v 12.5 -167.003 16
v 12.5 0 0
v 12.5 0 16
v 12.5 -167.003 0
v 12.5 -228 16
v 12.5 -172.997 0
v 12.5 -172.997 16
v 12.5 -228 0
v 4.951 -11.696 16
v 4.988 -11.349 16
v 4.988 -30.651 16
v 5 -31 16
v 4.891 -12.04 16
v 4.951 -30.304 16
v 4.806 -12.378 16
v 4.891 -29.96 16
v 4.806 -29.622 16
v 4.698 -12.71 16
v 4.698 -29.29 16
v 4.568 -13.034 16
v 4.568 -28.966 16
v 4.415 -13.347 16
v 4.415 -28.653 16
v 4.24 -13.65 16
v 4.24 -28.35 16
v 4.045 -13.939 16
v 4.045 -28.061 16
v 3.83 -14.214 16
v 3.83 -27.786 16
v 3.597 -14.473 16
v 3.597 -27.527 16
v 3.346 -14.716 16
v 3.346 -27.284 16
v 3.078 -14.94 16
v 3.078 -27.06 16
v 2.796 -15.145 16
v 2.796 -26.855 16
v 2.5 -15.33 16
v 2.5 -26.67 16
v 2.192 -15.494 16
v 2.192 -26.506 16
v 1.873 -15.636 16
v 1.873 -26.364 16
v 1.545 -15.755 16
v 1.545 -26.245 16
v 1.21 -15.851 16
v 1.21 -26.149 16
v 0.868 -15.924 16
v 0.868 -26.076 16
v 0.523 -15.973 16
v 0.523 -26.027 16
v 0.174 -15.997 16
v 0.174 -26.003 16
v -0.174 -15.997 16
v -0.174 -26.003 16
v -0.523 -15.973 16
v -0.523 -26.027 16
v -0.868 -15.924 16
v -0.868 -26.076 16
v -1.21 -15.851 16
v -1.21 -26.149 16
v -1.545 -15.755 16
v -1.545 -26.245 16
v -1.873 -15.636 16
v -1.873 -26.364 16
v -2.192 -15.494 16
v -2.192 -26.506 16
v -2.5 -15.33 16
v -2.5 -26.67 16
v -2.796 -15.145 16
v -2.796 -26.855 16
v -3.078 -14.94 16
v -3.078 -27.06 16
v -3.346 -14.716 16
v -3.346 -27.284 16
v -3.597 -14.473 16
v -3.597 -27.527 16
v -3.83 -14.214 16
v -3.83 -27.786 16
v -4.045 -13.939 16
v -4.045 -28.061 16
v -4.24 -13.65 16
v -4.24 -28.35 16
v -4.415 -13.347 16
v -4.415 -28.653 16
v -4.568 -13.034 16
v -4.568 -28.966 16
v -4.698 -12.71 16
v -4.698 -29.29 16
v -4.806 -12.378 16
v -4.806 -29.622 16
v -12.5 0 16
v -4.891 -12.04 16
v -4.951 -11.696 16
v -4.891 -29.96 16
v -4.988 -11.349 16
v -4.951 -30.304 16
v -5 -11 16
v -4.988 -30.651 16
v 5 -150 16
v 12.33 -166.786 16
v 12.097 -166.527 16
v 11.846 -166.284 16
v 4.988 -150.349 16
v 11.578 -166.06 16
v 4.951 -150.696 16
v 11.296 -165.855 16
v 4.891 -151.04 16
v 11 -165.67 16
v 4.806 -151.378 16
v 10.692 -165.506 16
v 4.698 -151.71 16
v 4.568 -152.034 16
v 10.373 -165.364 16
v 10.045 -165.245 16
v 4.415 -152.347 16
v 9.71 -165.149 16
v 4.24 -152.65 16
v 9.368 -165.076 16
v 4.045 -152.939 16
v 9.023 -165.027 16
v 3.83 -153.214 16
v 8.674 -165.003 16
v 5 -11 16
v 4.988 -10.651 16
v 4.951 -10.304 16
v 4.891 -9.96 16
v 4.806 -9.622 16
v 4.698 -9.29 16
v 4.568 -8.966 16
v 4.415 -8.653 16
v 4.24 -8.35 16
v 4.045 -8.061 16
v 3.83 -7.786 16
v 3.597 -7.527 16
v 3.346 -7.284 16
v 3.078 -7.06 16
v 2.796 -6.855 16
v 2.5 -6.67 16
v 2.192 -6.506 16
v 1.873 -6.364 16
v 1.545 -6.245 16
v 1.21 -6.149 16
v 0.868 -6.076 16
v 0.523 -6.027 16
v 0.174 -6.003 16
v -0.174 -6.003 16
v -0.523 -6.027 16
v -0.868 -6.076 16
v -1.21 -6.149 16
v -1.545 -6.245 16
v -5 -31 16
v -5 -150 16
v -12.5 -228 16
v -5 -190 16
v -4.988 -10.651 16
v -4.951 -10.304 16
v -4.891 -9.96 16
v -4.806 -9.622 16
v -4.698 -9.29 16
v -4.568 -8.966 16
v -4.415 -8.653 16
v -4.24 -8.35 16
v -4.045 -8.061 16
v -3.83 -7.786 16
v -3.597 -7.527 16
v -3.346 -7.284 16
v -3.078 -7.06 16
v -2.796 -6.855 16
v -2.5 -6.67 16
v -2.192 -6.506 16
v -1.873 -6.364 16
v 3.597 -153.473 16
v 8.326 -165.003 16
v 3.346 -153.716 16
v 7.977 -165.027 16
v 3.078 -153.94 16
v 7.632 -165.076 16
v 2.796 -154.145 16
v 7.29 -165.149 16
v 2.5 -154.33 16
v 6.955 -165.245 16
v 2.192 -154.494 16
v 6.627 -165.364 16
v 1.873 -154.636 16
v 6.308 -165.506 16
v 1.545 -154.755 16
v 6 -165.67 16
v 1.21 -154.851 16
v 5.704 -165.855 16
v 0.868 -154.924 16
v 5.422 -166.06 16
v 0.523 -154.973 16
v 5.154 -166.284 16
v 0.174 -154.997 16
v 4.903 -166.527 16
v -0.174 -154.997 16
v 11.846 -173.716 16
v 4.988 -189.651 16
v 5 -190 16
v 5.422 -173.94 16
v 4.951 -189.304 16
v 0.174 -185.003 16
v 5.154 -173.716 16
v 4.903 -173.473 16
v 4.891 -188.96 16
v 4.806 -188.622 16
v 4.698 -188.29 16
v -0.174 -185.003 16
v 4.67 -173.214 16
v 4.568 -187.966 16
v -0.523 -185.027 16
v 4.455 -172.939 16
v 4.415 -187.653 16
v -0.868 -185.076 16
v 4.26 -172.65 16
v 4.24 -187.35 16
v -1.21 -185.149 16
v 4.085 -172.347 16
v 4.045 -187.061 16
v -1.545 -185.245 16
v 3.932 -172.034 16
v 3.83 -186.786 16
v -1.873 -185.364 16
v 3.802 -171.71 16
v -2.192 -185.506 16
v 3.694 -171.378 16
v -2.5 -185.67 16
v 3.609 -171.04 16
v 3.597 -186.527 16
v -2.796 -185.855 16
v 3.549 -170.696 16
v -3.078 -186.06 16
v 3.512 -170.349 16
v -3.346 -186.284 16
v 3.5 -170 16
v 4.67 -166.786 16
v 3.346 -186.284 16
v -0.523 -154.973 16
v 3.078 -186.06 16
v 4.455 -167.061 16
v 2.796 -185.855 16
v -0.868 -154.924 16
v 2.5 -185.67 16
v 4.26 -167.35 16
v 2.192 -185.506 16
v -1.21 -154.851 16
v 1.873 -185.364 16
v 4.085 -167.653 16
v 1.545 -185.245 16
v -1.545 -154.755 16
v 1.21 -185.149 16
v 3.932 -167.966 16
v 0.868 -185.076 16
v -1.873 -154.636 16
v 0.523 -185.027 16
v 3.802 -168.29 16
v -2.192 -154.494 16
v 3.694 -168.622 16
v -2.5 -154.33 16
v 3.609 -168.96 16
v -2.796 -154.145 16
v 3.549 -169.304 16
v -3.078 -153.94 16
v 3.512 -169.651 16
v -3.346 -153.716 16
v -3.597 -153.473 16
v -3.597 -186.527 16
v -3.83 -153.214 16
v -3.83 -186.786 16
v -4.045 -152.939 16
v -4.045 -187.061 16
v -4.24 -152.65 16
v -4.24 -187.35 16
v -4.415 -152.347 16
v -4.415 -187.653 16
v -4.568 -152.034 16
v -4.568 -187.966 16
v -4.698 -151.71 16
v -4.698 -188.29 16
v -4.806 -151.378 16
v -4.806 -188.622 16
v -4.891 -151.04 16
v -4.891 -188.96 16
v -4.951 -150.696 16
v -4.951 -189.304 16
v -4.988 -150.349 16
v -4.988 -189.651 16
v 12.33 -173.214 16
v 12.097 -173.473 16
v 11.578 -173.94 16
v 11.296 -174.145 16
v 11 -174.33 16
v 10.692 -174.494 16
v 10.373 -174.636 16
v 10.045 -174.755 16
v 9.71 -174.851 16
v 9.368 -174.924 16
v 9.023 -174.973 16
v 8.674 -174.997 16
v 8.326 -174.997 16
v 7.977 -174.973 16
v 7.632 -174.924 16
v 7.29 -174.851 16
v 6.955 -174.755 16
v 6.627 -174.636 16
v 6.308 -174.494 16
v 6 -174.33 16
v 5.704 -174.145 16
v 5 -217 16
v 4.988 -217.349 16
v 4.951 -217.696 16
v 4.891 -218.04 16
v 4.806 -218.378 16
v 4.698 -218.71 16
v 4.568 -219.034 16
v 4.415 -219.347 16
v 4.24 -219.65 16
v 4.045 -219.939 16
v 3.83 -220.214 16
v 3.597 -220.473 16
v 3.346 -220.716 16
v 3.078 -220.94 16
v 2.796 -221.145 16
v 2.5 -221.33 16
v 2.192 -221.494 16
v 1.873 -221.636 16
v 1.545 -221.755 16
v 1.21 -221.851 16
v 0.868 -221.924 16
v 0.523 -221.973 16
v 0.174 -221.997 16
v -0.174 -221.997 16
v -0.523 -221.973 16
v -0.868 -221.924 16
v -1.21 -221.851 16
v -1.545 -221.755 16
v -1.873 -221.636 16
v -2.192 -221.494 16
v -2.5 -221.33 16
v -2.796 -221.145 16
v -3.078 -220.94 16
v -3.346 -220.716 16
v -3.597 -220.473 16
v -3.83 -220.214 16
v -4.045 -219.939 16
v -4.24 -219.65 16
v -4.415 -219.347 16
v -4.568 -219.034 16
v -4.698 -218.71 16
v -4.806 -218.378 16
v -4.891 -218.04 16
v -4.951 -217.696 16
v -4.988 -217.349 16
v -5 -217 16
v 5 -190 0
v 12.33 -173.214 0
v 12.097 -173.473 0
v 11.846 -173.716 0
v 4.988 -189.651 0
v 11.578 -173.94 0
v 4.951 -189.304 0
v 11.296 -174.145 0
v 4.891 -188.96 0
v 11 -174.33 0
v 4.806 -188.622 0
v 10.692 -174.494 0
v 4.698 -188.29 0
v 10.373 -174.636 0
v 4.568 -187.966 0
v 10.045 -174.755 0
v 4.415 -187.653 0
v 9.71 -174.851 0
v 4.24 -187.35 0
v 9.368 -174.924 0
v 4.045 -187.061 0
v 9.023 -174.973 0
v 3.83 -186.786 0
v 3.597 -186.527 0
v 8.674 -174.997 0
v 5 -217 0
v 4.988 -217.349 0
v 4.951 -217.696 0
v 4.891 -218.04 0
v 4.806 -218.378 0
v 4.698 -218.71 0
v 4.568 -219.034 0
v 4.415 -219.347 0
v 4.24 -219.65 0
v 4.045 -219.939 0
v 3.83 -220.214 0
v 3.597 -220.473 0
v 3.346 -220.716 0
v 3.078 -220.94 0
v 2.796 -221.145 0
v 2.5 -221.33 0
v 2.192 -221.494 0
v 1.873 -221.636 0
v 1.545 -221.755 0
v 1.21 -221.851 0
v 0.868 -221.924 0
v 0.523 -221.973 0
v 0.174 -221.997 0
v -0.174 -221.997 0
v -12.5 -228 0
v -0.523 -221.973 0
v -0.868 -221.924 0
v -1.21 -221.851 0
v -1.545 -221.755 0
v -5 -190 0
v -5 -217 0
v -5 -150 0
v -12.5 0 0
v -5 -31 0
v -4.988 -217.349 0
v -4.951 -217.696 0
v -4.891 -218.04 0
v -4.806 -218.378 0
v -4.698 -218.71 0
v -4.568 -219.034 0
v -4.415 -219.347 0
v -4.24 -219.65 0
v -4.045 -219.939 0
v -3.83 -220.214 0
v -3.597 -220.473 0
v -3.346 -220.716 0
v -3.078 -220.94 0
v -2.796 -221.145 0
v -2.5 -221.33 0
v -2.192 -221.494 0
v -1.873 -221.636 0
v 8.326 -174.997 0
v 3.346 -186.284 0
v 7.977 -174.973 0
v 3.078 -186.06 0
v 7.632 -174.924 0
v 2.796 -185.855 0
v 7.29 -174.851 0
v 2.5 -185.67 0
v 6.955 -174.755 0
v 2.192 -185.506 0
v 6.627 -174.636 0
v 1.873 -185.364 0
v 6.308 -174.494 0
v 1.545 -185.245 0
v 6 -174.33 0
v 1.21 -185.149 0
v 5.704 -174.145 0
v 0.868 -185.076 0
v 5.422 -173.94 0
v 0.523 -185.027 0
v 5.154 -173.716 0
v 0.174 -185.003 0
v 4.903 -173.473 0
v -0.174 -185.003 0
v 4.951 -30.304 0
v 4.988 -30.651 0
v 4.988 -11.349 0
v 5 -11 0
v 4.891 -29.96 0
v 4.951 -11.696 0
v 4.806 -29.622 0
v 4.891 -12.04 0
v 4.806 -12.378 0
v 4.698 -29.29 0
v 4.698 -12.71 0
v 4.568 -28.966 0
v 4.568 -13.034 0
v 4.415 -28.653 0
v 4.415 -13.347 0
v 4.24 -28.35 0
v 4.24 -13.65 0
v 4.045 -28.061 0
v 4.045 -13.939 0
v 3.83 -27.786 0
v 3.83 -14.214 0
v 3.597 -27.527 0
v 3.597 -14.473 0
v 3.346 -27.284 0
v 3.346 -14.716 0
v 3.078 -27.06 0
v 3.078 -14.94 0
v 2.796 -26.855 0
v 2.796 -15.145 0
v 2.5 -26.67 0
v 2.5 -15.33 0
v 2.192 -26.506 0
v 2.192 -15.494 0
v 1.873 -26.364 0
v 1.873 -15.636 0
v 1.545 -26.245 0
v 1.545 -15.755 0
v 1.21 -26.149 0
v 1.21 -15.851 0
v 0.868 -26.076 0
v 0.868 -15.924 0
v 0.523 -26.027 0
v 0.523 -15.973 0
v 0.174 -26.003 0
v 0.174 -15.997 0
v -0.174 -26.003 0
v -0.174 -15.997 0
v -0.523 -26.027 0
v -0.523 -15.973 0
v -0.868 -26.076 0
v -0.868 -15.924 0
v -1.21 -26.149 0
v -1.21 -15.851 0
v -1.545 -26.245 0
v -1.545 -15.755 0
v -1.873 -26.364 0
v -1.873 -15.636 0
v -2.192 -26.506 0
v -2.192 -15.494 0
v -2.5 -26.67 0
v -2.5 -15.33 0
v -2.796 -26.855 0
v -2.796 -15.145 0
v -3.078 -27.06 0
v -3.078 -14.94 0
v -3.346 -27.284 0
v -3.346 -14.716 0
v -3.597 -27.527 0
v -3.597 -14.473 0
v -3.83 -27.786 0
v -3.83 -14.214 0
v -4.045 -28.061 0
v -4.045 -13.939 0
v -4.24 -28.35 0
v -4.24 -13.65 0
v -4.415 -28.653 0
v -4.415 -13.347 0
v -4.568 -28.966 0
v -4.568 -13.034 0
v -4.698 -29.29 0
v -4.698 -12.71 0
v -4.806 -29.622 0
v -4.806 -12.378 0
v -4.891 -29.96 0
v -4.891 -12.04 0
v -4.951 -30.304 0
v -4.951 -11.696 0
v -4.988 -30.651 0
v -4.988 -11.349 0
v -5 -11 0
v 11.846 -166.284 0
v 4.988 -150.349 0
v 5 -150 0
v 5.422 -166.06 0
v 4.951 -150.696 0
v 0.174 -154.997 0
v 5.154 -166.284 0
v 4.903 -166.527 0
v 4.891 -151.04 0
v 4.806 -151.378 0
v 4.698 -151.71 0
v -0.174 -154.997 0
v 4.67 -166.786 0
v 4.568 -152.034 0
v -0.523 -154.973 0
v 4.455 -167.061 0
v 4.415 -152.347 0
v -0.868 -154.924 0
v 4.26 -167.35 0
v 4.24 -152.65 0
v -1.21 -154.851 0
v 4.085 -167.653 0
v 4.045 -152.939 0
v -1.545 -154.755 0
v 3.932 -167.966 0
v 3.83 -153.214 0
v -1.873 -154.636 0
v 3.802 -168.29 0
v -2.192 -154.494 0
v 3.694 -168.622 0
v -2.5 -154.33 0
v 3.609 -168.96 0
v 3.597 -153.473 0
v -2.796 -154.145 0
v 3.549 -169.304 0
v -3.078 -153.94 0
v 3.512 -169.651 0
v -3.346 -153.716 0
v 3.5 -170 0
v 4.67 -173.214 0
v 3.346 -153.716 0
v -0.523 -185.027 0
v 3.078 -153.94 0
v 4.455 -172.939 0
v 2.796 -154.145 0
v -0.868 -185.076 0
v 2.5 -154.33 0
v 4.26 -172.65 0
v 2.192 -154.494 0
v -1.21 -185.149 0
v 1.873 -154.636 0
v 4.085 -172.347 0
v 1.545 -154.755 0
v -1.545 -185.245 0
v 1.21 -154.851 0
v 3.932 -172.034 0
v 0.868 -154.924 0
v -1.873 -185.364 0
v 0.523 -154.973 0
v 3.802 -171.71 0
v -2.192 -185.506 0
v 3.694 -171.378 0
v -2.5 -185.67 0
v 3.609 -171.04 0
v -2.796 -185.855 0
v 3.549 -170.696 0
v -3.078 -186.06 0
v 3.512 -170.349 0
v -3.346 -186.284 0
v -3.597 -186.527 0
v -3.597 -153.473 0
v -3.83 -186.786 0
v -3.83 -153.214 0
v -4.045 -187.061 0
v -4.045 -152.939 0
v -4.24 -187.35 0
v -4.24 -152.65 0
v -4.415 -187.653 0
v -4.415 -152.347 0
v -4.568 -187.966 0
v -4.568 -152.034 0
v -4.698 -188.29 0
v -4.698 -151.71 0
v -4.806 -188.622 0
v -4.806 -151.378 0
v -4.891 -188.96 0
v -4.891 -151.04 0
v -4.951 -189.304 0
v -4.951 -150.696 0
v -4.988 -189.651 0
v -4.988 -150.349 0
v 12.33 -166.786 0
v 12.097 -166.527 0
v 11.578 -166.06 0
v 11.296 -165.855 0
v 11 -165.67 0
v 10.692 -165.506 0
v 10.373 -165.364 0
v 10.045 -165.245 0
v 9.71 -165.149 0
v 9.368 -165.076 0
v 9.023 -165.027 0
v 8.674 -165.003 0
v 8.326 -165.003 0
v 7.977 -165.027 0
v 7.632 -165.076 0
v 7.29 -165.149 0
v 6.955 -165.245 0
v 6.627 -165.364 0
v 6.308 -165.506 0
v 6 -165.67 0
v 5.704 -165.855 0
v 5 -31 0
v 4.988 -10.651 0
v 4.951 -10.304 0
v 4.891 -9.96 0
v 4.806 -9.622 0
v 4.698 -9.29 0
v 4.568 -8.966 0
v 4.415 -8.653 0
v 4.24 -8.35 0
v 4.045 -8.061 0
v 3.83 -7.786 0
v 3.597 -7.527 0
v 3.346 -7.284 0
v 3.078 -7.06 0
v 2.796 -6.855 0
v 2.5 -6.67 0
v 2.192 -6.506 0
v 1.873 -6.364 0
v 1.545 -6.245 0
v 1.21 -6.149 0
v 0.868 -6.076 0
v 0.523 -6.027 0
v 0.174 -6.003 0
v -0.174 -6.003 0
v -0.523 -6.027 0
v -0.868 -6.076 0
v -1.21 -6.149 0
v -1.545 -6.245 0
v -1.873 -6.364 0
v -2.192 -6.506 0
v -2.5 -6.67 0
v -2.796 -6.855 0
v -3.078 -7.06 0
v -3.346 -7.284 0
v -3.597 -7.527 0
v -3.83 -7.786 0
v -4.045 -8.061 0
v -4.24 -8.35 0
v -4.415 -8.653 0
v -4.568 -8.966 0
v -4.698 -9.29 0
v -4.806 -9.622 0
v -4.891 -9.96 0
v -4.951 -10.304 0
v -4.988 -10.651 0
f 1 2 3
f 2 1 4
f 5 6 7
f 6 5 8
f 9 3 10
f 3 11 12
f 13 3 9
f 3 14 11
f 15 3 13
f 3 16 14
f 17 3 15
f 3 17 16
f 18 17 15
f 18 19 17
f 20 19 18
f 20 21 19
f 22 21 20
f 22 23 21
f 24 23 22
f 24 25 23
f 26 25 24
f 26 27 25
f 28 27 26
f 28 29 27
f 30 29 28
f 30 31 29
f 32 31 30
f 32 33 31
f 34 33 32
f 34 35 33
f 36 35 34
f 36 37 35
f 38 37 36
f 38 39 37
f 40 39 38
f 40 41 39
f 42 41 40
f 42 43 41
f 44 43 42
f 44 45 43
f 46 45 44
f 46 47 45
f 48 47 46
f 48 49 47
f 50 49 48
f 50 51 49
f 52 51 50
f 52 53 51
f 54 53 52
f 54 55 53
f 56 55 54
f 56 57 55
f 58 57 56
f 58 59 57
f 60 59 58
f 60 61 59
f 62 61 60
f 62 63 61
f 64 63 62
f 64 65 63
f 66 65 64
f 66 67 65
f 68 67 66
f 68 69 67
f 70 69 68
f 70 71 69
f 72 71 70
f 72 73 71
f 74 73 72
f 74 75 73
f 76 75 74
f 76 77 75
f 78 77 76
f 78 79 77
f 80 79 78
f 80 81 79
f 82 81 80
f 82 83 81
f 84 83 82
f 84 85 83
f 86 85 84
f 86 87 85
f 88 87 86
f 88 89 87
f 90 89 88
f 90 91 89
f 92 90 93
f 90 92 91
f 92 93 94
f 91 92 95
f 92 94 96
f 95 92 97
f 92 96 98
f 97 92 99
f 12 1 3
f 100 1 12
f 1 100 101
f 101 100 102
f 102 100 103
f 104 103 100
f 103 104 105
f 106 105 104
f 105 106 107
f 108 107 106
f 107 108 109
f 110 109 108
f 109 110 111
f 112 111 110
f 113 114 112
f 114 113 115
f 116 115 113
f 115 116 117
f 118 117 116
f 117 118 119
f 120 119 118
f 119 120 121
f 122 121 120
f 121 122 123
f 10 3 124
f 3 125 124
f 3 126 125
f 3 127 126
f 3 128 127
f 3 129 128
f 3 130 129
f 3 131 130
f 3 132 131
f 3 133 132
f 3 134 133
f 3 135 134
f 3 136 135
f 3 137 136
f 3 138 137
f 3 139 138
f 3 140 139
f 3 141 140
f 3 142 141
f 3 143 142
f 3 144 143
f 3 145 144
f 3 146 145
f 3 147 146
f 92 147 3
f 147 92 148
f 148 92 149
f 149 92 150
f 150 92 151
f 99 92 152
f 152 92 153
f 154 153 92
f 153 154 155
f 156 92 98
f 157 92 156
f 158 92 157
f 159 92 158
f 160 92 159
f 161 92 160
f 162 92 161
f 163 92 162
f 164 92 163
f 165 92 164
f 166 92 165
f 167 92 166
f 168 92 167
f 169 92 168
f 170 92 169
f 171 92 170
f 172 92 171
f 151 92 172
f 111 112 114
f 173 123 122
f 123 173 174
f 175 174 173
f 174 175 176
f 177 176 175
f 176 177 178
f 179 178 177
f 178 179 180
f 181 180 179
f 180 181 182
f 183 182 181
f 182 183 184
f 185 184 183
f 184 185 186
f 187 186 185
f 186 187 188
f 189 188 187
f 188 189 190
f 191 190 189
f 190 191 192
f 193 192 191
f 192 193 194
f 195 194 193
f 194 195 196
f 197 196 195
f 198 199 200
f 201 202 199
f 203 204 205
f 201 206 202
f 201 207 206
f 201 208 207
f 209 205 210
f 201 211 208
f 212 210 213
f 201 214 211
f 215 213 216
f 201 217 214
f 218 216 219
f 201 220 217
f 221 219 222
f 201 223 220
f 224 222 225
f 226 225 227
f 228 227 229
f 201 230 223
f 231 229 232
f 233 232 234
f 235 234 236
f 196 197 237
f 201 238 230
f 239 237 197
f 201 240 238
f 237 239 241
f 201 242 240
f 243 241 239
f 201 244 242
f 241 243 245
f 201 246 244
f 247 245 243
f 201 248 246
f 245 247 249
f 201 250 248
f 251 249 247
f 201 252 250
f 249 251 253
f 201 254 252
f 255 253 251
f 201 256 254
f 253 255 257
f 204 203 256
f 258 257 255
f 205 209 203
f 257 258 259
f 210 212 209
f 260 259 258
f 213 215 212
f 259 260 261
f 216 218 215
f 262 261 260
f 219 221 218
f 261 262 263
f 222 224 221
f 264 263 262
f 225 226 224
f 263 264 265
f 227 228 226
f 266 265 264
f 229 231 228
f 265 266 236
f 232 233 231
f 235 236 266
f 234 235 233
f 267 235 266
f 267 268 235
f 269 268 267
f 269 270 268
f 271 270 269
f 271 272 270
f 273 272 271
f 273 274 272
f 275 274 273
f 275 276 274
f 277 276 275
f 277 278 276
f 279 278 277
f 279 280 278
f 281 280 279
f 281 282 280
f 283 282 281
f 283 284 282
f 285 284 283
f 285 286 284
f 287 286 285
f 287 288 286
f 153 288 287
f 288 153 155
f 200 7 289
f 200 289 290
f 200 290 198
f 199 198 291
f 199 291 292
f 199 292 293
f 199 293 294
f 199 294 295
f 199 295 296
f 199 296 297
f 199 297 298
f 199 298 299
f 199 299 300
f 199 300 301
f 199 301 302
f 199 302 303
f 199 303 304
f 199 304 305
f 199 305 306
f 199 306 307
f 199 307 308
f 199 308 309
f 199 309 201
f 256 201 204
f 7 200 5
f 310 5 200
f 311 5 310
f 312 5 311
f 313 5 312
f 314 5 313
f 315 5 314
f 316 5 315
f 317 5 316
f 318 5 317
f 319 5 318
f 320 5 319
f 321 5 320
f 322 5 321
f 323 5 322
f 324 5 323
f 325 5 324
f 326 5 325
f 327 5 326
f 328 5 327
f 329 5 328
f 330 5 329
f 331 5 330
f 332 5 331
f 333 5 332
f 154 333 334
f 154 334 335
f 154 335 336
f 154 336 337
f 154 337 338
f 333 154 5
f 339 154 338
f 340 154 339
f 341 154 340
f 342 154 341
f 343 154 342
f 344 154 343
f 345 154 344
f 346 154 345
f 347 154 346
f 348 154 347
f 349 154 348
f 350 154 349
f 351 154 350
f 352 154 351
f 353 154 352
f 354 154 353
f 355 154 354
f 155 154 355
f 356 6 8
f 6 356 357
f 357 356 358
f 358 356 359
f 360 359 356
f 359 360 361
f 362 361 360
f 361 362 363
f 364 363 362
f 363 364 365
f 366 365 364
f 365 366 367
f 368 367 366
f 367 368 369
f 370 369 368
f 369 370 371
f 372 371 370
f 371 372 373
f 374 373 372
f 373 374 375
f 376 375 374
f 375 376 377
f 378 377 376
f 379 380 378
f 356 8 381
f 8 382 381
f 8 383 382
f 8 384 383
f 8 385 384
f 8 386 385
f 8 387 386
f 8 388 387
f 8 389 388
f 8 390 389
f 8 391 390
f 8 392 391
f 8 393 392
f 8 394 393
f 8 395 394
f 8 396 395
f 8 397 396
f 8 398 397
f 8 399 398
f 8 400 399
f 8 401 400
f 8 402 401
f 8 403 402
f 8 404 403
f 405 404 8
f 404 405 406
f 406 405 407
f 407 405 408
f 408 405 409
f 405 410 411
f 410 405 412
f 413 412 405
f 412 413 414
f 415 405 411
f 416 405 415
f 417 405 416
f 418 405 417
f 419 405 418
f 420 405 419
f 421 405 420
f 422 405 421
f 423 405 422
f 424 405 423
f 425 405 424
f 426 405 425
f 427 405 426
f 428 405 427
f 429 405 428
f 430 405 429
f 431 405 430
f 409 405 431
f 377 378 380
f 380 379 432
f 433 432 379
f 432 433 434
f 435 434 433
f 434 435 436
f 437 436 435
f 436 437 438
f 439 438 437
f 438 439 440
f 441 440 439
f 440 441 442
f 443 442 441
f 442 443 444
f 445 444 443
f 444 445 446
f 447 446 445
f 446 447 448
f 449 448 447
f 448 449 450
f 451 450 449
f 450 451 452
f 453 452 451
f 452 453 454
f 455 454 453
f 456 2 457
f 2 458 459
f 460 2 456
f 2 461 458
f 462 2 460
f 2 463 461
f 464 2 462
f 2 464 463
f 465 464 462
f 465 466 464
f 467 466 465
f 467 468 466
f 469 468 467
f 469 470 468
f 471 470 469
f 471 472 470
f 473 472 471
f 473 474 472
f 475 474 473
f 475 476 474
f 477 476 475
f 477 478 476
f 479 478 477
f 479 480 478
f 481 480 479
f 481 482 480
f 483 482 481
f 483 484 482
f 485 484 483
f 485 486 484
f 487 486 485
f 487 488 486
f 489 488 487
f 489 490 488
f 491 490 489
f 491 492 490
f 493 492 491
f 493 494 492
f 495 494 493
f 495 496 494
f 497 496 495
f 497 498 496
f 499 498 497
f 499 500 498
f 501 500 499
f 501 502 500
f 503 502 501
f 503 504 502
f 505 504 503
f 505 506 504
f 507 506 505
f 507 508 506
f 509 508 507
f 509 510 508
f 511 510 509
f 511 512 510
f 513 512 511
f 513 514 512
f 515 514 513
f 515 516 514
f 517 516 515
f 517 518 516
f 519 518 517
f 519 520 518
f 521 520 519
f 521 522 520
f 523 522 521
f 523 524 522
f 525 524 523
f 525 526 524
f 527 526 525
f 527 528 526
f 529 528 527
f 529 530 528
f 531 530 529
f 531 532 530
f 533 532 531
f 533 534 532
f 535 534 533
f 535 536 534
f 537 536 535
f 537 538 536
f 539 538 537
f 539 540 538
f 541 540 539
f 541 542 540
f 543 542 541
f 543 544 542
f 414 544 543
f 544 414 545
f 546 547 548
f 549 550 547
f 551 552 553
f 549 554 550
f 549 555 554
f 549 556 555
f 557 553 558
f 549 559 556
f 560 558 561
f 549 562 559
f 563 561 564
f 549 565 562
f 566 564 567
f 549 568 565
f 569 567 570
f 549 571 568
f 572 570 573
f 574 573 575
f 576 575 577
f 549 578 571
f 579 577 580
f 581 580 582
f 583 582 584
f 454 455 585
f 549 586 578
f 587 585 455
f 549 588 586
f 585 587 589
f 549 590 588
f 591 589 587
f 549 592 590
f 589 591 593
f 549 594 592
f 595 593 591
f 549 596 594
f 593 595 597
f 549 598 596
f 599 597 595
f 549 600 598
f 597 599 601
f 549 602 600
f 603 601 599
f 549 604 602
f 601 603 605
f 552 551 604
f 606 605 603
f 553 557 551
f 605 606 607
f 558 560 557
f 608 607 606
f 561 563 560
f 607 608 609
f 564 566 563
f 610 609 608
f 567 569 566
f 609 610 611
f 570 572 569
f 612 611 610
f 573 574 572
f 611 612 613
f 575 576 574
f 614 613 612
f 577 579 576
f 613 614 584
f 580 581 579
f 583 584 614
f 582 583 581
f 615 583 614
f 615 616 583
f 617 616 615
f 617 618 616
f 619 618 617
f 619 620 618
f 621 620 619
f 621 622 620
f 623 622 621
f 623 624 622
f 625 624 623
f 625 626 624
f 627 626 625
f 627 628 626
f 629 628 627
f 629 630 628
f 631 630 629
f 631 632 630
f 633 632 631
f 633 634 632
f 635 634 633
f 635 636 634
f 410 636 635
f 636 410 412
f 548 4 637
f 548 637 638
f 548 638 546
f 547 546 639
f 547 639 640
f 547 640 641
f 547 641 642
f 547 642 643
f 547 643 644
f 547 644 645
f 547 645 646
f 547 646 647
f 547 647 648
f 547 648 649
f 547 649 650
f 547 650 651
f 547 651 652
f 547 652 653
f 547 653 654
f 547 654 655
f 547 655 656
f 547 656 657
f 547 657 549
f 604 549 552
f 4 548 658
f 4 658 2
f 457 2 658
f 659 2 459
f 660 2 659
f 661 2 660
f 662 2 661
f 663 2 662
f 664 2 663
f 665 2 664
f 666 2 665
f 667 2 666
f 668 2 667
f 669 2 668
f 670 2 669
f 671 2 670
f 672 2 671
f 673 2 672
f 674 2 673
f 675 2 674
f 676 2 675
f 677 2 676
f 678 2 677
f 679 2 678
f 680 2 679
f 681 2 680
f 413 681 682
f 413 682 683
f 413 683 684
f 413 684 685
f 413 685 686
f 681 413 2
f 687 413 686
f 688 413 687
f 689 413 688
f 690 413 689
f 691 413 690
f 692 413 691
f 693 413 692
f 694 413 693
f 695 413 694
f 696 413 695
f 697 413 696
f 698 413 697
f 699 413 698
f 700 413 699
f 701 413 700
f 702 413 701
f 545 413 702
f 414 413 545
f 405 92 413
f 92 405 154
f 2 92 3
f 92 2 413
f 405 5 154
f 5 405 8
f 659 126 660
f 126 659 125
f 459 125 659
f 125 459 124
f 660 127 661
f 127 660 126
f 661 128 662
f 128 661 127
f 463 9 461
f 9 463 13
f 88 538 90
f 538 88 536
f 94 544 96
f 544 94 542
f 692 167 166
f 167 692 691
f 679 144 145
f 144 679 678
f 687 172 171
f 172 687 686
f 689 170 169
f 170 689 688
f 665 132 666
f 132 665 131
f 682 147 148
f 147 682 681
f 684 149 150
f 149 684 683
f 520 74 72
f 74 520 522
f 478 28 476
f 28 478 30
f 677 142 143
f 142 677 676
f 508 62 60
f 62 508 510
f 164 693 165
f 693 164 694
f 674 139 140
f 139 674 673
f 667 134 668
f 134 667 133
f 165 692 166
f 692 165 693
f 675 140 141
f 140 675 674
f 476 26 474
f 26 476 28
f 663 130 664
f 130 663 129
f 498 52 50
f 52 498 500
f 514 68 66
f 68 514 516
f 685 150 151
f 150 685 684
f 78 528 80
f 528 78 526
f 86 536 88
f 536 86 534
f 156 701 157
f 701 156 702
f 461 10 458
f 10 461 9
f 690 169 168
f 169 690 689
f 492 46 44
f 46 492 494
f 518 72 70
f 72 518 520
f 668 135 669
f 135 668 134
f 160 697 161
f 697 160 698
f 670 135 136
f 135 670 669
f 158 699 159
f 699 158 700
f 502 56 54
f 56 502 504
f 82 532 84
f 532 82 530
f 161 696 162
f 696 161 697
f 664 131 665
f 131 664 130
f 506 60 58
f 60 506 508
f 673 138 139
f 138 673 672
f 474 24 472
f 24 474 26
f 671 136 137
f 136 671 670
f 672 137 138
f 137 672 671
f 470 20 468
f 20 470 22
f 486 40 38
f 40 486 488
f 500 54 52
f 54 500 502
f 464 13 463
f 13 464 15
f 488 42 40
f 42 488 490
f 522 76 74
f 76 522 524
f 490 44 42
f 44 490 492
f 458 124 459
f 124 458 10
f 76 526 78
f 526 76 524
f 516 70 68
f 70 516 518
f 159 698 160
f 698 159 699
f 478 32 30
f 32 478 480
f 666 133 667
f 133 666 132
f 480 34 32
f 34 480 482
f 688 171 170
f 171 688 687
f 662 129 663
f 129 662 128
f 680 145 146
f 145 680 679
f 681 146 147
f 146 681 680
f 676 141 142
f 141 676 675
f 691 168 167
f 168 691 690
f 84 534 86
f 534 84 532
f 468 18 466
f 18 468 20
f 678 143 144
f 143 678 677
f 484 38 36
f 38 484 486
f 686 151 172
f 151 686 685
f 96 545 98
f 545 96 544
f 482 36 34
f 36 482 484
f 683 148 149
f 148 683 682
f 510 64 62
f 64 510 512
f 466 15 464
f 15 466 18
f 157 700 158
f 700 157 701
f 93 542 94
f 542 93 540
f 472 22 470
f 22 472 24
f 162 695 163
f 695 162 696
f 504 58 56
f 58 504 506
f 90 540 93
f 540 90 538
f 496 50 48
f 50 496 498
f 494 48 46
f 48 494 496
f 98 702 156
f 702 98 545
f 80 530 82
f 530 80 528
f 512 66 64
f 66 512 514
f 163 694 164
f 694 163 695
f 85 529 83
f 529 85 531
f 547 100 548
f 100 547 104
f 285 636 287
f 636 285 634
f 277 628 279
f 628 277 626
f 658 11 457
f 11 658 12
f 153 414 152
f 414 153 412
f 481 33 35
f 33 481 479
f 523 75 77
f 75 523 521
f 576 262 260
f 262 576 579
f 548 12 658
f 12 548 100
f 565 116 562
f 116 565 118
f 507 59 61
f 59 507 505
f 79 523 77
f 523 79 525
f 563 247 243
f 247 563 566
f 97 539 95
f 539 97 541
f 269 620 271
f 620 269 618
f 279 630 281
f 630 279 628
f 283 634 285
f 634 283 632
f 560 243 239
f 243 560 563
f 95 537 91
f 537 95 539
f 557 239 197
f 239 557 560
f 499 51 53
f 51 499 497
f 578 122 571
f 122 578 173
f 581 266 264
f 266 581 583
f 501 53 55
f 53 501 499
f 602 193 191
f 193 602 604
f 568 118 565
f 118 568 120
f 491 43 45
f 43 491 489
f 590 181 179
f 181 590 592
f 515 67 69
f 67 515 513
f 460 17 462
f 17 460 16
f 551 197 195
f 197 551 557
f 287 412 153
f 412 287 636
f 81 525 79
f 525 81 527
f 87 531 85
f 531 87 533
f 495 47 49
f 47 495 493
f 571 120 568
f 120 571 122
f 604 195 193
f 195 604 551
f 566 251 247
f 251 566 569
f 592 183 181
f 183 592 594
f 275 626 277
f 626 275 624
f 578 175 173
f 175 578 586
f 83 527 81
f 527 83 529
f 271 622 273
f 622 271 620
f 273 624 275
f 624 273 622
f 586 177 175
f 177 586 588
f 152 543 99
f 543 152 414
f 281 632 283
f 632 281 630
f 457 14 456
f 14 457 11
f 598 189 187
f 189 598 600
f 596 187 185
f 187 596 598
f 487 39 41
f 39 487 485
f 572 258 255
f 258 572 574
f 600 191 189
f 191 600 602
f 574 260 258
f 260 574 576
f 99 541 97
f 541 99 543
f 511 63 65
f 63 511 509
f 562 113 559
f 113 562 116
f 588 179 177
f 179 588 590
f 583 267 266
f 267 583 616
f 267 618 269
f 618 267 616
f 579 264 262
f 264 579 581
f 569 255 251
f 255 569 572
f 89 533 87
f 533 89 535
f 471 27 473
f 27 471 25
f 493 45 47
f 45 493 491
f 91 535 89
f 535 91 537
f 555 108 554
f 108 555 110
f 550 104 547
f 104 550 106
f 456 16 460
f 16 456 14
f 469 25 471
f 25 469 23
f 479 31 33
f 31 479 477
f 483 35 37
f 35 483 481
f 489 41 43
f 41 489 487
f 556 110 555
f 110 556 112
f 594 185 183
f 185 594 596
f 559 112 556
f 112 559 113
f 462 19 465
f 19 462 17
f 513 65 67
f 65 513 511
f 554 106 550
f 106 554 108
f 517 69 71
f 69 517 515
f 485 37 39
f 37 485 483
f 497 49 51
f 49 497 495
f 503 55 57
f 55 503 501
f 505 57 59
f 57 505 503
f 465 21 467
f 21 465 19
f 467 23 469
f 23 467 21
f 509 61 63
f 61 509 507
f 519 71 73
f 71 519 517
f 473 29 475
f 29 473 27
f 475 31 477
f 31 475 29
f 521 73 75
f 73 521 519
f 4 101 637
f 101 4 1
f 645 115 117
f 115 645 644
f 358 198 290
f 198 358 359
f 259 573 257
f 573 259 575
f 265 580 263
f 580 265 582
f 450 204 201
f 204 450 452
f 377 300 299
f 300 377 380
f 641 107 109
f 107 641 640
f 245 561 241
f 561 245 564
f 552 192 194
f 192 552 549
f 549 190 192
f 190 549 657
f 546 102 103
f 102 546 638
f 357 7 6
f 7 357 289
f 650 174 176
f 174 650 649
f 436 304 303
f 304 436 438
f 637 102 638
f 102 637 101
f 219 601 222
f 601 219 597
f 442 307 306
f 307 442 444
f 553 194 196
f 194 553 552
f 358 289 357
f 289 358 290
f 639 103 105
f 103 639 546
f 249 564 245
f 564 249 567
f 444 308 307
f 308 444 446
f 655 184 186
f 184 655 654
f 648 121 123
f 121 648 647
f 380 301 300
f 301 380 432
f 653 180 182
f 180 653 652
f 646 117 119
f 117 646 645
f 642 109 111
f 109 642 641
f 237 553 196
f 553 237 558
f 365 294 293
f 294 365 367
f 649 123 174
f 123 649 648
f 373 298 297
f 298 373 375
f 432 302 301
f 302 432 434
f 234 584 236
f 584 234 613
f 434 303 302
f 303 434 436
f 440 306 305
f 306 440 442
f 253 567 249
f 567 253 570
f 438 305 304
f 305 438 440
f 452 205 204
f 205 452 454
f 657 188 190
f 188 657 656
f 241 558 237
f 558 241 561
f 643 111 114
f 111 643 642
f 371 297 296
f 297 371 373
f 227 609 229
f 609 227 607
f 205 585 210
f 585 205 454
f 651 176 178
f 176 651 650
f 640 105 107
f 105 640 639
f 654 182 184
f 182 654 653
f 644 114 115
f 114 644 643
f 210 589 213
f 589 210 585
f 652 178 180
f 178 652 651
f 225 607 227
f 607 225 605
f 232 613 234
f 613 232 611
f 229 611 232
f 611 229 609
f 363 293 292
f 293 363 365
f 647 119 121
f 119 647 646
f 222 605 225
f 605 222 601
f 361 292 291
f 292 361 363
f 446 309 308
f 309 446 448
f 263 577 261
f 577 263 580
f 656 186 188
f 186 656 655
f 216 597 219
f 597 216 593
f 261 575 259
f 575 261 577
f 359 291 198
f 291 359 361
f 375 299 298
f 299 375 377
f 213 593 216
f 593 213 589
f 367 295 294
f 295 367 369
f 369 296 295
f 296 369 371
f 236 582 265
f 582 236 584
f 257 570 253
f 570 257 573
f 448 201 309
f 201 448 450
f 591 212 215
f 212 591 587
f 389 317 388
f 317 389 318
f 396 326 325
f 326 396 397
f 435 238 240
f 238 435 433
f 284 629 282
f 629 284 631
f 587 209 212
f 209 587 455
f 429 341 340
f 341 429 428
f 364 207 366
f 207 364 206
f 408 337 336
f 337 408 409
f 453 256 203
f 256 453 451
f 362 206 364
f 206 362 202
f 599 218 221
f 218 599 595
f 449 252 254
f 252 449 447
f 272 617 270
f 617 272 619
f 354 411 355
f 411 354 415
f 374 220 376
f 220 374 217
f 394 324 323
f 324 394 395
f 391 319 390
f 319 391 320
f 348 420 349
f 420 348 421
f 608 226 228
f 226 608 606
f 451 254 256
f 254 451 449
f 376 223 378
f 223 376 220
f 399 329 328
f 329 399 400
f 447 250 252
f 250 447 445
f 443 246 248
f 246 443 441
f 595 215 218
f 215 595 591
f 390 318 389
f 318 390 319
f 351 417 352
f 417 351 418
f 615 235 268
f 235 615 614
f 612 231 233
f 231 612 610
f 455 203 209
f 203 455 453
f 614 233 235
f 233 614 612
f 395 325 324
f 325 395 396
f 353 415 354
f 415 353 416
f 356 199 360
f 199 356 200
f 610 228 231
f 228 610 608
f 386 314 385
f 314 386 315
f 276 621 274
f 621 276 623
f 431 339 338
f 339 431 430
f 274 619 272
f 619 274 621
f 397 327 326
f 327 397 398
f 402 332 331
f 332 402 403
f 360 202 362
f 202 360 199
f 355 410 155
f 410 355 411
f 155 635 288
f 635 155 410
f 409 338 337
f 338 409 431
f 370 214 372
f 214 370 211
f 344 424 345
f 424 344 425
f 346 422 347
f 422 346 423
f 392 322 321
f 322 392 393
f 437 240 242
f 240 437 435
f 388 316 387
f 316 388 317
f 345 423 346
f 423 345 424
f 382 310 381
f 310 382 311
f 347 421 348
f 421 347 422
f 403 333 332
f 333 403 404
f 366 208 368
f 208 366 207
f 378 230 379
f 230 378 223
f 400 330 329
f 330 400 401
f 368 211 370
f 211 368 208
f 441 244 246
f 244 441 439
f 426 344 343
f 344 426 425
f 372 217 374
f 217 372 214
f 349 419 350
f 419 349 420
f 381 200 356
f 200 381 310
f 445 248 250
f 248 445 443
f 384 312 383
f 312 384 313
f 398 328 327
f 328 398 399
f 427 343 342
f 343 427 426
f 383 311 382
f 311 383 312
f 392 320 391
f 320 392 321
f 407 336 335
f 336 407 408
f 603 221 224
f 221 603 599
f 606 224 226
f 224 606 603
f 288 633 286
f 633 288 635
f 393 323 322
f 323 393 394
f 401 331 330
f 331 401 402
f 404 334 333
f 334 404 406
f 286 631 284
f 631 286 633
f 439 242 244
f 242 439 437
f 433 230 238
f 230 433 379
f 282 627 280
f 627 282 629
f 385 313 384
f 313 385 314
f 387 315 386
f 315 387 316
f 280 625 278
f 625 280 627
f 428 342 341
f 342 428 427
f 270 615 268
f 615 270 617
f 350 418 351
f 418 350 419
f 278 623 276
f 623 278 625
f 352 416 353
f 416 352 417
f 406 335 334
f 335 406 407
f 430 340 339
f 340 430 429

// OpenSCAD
w = 25;
h = 228;
d = 16; // height of skadis mount

hole_d = 10;

$fn = 90;

difference() {
  translate([w/-2, -h, 0])
    cube([w, h, d]);

  translate([0, -11, 0])
    cylinder(d*3, d=hole_d, center=true);

  // translate([0, -11, 0])
  // for (i = [0:5]) {
  //   translate([0, (hole_d*-2) * i, 0])
  //     cylinder(d*3, d=hole_d, center=true);
  // }

  hull() {
    translate([0, -(11+hole_d*2), 0])
      cylinder(d*3, d=hole_d, center=true);

    translate([0, -(170-hole_d*2), 0])
      cylinder(d*3, d=hole_d, center=true);
  }

  translate([(21-(w/2)), -170, 0])
    cylinder(d*3, d=hole_d, center=true);


  hull() {
    translate([0, -(170+hole_d*2), 0])
      cylinder(d*3, d=hole_d, center=true);

    translate([0, -h +11, 0])
      cylinder(d*3, d=hole_d, center=true);
  }
}
